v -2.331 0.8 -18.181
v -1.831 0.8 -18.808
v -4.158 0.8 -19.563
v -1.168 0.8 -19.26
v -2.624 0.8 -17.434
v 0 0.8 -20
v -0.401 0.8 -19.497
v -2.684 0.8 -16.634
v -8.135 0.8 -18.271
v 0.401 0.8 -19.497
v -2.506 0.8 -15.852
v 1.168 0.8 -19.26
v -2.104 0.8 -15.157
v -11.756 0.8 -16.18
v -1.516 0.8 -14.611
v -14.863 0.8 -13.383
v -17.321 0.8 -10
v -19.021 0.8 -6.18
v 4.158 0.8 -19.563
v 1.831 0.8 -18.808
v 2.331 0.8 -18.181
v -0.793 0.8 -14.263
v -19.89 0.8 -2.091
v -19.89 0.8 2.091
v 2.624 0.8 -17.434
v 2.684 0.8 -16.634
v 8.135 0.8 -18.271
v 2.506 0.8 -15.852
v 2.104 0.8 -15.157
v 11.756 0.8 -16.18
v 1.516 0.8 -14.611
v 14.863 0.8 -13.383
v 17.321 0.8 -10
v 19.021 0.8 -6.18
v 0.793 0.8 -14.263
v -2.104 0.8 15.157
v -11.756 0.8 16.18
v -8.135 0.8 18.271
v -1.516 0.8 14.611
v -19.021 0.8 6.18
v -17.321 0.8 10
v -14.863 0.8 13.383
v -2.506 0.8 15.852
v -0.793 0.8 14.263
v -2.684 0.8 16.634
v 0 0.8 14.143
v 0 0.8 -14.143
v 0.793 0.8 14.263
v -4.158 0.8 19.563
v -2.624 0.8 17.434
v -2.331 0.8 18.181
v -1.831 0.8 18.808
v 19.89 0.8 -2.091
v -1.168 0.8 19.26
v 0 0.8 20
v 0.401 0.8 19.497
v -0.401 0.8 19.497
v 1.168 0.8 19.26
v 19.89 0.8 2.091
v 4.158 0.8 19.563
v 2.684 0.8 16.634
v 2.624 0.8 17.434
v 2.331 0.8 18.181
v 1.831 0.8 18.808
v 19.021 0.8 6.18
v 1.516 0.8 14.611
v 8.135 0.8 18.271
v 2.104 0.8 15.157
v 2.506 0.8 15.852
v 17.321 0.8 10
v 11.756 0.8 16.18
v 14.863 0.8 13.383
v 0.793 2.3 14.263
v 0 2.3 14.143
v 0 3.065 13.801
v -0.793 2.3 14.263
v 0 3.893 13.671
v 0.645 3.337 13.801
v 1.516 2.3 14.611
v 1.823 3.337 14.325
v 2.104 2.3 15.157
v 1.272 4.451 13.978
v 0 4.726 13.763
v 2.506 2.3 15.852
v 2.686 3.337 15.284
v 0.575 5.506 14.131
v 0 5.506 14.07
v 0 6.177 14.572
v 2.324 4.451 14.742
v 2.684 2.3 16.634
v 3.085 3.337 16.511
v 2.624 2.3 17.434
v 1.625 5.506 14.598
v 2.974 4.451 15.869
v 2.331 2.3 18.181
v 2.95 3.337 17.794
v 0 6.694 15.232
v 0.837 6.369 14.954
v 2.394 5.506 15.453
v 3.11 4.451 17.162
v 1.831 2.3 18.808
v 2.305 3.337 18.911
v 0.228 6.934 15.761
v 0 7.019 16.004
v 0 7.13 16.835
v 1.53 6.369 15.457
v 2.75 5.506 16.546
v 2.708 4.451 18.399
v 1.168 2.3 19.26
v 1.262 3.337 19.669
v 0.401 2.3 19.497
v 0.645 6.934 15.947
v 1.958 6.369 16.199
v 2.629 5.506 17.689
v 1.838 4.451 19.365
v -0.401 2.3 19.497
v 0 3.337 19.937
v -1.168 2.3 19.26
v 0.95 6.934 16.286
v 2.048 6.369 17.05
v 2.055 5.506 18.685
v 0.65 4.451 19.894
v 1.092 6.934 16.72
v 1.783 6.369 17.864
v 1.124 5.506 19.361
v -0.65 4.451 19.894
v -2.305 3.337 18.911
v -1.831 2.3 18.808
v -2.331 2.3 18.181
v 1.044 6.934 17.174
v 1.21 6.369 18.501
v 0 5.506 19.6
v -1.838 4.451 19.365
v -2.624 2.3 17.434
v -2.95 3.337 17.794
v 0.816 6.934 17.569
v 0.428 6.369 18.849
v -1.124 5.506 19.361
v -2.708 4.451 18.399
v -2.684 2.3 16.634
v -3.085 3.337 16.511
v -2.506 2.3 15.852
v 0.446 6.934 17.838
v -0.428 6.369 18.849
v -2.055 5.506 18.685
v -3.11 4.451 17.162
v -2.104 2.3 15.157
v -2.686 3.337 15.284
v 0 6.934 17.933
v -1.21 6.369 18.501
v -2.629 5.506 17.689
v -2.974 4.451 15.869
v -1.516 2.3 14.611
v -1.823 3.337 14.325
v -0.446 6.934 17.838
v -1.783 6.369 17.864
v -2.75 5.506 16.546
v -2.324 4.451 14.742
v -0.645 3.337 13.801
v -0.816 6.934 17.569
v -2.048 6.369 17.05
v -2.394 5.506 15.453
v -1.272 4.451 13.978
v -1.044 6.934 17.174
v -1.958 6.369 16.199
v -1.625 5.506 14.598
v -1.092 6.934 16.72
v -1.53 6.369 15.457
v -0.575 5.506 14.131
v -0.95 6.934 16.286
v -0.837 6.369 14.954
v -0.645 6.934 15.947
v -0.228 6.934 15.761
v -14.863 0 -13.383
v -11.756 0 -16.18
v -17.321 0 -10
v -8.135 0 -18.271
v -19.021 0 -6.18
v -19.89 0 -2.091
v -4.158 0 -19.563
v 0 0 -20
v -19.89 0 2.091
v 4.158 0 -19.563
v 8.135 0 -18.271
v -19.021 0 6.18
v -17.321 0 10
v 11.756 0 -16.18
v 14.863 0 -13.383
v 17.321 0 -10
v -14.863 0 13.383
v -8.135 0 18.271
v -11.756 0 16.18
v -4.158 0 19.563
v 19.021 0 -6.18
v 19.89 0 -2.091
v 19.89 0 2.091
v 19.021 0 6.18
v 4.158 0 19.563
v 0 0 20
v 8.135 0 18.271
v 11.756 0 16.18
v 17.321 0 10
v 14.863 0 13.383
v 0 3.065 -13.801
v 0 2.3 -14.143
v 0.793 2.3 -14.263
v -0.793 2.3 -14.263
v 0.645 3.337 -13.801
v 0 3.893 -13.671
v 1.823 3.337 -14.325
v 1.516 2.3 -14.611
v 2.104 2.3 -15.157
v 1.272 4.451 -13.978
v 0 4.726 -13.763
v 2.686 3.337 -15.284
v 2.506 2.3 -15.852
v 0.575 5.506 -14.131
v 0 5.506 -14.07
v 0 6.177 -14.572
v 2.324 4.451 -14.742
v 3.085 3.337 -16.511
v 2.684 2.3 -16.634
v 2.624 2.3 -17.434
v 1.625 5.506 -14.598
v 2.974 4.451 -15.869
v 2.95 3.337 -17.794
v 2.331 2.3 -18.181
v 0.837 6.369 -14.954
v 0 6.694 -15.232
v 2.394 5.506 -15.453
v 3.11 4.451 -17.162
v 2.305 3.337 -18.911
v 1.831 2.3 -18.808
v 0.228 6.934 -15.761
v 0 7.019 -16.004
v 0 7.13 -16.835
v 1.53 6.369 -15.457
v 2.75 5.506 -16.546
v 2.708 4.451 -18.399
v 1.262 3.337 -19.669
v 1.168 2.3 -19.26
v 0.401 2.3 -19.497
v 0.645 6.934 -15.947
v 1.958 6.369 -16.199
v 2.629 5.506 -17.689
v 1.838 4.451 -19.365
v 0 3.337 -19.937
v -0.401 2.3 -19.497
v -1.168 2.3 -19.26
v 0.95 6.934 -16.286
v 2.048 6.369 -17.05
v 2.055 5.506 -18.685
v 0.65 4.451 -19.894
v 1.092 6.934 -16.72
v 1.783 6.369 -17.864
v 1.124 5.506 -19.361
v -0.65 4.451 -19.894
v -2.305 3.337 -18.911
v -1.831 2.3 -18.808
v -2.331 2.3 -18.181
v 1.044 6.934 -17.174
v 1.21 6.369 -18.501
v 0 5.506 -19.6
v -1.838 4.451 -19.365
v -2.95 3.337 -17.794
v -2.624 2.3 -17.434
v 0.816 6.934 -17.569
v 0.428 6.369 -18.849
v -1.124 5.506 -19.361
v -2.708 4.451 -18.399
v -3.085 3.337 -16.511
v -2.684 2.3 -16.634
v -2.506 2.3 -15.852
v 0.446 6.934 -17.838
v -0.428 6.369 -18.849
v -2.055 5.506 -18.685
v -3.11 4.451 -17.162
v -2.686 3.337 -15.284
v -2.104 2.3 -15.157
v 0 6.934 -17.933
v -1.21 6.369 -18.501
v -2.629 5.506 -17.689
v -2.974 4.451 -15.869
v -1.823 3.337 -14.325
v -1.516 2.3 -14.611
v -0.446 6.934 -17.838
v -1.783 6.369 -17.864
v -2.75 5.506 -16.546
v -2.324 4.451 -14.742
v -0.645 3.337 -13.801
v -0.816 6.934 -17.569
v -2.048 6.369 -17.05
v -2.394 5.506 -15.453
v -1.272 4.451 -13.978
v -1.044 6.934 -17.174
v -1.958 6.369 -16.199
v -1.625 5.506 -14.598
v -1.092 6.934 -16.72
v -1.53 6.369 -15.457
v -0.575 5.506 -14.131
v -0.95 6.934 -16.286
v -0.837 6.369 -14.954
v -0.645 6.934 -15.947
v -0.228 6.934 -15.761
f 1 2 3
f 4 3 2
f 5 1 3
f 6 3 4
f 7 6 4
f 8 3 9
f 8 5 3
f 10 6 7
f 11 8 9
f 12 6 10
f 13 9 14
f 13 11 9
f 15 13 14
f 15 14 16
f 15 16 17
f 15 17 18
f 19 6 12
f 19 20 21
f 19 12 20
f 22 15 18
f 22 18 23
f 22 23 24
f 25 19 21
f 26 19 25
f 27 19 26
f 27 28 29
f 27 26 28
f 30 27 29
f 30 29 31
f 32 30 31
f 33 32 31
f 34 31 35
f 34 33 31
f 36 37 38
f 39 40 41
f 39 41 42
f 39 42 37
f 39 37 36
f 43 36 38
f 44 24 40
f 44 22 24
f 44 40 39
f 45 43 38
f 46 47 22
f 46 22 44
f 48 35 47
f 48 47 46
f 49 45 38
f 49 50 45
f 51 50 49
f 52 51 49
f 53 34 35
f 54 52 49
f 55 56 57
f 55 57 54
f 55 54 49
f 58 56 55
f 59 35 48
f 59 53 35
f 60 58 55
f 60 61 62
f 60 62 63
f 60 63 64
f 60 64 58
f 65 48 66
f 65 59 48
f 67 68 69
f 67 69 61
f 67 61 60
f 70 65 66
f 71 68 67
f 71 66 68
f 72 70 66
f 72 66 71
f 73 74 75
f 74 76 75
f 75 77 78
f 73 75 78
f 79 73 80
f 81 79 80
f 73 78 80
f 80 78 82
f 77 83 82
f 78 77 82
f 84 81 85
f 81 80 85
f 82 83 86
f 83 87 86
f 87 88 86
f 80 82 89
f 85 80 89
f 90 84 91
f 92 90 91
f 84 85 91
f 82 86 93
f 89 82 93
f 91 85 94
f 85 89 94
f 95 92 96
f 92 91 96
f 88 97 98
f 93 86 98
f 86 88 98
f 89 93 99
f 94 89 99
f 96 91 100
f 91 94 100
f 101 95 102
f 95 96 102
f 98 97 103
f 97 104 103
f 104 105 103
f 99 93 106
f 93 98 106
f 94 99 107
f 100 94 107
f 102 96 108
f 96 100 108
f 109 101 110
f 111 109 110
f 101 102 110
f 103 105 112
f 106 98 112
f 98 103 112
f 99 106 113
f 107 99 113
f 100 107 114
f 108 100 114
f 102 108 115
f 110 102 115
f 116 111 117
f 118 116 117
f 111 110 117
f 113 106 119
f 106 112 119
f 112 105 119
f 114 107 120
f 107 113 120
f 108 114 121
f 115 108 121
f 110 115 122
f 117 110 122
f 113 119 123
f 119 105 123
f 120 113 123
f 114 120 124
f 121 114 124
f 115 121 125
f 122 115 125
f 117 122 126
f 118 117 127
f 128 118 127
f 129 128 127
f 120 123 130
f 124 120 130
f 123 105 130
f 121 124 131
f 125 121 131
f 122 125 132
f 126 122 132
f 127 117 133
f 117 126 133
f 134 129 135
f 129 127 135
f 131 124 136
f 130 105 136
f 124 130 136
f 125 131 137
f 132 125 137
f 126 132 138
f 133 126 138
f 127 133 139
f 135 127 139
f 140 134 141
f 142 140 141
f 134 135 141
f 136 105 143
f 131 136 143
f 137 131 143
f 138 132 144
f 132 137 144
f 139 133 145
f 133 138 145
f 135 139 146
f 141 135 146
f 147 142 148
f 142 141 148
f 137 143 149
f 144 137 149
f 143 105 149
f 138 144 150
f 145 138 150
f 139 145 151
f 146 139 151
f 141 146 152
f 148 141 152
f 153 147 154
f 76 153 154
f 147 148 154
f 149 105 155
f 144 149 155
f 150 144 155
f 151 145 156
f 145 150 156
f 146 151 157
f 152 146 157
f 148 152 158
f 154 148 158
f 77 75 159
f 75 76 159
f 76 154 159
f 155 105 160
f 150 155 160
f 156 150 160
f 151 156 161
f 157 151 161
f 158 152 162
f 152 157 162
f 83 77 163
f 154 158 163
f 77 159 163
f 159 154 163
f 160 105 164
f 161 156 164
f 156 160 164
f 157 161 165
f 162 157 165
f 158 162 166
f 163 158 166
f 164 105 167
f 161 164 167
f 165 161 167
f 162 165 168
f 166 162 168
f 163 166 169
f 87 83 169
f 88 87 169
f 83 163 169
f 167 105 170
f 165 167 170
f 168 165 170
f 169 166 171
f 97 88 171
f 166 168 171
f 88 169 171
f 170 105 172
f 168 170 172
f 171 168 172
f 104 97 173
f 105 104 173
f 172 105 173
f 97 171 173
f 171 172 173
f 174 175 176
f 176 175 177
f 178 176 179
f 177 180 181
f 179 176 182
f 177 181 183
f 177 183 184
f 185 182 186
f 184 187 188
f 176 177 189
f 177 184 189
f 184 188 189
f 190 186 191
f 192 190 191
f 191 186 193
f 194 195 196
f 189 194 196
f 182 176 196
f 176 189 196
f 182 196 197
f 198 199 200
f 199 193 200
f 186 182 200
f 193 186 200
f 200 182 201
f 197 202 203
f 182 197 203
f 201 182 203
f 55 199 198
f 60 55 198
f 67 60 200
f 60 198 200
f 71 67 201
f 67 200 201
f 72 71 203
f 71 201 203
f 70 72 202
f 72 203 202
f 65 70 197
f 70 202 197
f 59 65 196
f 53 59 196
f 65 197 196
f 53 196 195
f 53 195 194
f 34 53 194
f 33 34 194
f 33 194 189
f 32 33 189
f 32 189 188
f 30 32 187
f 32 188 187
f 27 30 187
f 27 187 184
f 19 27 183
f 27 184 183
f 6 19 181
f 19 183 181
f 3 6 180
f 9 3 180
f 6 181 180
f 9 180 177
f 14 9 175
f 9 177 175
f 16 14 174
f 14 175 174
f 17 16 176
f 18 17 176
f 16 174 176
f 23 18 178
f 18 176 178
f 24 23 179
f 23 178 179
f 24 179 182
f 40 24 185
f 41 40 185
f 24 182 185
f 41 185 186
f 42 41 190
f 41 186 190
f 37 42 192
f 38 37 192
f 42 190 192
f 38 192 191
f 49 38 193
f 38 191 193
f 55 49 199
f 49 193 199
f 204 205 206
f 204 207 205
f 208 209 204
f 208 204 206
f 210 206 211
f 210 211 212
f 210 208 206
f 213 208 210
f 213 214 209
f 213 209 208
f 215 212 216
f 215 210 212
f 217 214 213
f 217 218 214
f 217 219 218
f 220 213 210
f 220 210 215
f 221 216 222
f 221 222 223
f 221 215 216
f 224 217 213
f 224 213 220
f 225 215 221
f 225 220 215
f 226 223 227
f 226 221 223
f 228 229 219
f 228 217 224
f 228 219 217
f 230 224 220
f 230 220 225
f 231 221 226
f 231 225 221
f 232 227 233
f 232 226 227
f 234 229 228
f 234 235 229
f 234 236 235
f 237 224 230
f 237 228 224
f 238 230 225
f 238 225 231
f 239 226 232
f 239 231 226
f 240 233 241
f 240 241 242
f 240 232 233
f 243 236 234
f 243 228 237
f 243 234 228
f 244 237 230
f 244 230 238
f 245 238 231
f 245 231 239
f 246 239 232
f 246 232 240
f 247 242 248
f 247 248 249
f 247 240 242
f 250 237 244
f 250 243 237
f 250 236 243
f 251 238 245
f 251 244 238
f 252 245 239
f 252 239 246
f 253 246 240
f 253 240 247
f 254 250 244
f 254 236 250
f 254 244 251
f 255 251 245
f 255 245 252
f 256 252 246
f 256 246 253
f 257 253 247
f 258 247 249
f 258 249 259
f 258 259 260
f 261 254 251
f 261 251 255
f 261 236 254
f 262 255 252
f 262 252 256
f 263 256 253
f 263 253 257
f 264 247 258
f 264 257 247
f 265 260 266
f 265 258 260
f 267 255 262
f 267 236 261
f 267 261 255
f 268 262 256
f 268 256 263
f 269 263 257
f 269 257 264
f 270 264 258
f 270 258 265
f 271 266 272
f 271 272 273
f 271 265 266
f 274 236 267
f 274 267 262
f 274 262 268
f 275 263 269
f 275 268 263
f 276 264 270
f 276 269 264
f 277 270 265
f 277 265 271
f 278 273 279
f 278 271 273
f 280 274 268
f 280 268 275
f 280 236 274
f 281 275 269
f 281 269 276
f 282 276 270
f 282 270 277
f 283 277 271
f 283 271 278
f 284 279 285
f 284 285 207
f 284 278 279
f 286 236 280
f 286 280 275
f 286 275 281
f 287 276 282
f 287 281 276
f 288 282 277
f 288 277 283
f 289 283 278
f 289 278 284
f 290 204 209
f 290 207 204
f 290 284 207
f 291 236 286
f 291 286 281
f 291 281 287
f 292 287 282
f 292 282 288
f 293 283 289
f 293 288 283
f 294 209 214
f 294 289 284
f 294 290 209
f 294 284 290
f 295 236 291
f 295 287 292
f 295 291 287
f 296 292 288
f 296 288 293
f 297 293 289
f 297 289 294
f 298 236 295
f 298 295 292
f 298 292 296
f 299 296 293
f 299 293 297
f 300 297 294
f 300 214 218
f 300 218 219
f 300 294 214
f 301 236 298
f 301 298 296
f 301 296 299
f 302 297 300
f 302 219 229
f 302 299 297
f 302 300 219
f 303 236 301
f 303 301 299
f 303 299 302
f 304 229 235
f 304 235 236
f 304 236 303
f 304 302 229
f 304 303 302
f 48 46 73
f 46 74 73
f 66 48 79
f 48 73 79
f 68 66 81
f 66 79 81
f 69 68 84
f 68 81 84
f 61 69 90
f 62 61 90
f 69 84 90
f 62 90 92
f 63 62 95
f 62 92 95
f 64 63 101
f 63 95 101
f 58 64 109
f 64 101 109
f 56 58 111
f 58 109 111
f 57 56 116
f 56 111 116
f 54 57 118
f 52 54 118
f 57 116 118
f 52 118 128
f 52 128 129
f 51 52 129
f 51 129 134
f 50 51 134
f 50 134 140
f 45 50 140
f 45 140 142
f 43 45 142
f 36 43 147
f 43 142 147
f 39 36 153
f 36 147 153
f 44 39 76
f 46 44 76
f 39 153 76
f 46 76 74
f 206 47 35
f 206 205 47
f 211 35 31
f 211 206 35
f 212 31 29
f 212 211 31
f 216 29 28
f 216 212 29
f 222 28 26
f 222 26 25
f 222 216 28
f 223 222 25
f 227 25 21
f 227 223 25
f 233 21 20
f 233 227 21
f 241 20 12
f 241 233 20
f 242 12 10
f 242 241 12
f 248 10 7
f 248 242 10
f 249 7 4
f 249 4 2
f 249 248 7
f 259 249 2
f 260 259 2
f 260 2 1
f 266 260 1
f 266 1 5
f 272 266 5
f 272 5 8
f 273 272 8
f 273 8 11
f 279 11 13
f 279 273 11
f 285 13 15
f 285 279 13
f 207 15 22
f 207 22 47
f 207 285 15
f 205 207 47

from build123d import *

# Parameters (mm, degrees)
SKETCH1_R = 20
PCB_DEPTH = 0.8


with BuildPart() as part:
    # Sketch1 → PCB (new body)
    with BuildSketch(Plane(origin=(0, 0, 0), x_dir=(1, 0, 0), z_dir=(0, 1, 0))):
        with Locations(Location((0, 0, 0), (0, 0, 270))):
            Circle(SKETCH1_R)
    extrude(amount=PCB_DEPTH)

    # Sketch3 → Revolve1 (revolve)
    with BuildSketch(Plane(origin=(0, 0, 0), x_dir=(0, 0, -1), z_dir=(1, 0, 0)), mode=Mode.PRIVATE) as revolve1_sk:
        with BuildLine():
            Line((-16.835, 7.13), (-16.835, 0.8))
            Line((-16.835, 0.8), (-19.526653767, 0.8))
            Line((-19.526653767, 0.8), (-19.526653767, 2.3))
            ThreePointArc((-19.526653767, 2.3), (-19.599683526, 5.505697894), (-16.835, 7.13))
        make_face()
    revolve1 = revolve(revolve1_sk.sketch.rotate(Axis((0, 7.13, 16.835), (0, -1, 0)), 180), axis=Axis((0, 7.13, 16.835), (0, -1, 0)))

    # Mirror1: Revolve1 across plane
    add(revolve1.mirror(Plane.XY))


solid = part.part
